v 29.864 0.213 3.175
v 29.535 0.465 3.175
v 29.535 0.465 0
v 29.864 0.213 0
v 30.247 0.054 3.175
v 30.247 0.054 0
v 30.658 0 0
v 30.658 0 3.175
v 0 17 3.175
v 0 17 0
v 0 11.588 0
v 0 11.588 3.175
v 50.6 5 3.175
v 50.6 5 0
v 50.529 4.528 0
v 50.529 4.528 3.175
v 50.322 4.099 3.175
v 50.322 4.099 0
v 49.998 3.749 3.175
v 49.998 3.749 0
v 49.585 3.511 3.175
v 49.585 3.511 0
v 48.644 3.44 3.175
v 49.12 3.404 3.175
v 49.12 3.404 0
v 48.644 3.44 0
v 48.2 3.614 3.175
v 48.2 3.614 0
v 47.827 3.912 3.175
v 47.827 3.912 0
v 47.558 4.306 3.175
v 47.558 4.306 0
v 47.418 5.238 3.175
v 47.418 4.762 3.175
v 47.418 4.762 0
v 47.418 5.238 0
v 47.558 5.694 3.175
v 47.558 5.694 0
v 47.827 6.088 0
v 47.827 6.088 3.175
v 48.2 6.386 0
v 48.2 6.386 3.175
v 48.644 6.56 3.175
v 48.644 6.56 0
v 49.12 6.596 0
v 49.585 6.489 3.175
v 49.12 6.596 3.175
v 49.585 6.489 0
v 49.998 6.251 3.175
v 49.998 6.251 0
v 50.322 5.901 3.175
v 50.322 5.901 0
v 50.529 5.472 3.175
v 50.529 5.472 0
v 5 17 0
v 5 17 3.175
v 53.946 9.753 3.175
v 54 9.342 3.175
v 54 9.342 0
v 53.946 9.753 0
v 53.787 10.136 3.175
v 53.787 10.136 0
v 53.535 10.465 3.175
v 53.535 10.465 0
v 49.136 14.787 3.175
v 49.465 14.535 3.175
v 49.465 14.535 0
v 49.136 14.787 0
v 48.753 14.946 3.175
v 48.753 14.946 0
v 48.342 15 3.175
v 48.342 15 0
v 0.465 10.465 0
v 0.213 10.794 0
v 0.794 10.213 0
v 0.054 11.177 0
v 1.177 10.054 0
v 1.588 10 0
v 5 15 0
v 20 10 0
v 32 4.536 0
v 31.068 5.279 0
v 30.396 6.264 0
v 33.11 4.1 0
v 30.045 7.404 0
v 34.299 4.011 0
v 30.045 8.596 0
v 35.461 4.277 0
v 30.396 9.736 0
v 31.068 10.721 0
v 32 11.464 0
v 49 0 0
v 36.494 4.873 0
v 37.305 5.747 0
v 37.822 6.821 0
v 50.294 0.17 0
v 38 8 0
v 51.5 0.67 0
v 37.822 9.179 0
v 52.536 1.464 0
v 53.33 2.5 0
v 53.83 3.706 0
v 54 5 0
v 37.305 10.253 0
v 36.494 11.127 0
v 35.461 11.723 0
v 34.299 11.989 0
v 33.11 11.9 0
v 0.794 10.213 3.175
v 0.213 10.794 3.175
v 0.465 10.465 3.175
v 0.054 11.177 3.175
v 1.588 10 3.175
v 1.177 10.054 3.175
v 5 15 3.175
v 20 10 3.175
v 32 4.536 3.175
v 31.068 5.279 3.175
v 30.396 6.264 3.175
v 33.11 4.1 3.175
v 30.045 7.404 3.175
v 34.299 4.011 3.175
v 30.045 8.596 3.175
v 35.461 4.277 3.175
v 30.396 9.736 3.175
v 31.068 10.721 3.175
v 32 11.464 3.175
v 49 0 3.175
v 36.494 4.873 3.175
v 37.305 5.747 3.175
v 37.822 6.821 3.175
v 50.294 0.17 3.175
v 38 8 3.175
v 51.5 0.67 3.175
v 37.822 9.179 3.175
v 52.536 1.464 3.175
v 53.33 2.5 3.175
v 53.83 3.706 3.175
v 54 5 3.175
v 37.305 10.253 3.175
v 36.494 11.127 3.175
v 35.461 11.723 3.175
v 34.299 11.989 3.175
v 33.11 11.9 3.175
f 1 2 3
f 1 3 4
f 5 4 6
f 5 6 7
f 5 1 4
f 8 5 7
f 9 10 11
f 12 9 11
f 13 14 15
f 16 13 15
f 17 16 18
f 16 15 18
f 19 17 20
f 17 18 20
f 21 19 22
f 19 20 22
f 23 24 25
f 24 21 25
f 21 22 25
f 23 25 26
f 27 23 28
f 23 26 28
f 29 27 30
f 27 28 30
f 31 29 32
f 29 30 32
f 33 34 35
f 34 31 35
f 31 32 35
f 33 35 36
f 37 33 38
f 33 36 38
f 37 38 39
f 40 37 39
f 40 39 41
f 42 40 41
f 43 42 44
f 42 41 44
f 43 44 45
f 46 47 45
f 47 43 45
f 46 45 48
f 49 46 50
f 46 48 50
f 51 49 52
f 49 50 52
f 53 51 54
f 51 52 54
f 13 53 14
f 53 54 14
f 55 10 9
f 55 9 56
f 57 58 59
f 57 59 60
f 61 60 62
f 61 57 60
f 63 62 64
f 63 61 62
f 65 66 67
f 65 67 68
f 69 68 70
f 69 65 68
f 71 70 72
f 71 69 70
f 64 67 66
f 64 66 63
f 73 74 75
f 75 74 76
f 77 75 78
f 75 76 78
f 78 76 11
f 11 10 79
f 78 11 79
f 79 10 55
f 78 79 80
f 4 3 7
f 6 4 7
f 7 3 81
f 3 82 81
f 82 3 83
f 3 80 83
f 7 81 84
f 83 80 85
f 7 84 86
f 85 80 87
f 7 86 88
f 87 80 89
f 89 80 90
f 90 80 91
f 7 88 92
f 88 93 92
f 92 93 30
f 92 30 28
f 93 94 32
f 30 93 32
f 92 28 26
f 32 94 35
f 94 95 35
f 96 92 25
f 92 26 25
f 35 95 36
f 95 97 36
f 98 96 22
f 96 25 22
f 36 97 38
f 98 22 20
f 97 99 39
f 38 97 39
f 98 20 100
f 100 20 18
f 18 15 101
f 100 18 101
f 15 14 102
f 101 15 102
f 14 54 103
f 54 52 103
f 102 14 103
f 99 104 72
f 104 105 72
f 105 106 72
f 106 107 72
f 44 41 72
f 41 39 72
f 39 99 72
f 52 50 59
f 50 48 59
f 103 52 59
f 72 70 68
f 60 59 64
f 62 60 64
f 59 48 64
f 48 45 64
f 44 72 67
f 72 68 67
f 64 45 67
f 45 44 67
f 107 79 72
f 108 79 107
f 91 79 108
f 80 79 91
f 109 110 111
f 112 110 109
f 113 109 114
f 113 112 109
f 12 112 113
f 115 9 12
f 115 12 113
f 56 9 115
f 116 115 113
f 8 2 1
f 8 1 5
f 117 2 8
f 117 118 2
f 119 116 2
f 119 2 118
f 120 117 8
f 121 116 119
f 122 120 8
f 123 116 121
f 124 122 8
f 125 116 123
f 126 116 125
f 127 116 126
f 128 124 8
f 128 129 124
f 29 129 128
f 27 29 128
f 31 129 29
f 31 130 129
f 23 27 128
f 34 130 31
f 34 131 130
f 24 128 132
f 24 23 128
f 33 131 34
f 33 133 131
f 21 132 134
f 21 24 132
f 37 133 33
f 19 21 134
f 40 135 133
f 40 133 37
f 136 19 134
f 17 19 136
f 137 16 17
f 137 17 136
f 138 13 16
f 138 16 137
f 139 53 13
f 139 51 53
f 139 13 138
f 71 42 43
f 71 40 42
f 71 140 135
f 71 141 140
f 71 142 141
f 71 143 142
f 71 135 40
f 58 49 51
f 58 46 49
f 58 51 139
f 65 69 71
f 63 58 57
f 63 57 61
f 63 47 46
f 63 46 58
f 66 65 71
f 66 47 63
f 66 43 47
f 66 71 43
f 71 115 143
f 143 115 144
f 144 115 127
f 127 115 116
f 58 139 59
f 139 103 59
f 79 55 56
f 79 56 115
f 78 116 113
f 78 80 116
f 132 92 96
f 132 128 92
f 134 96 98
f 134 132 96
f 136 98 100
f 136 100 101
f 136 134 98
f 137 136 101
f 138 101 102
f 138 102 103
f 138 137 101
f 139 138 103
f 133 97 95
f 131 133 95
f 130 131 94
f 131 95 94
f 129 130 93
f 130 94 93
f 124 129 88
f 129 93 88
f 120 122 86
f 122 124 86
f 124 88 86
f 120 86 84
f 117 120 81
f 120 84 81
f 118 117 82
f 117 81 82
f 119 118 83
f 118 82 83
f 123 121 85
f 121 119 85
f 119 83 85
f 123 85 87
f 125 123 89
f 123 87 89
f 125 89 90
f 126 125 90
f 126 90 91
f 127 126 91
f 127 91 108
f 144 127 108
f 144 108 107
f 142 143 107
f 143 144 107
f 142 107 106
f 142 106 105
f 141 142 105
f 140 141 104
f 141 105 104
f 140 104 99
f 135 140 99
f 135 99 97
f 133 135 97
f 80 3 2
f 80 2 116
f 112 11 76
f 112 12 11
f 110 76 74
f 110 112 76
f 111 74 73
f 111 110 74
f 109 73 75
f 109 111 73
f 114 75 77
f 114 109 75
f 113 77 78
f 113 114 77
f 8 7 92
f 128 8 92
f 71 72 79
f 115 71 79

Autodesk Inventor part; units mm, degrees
ref_plane "YZ Plane" through (0, 0, 0) normal (1, 0, 0) x (0, 1, 0)
ref_plane "XZ Plane" through (0, 0, 0) normal (0, 1, 0) x (-1, 0, 0)
ref_plane "XY Plane" through (0, 0, 0) normal (0, 0, 1) x (1, 0, 0)
sketch "Sketch1" plane through (0, 0, 0) normal (0, 0, 1) x (1, 0, 0)
  line L0 (30, 0) -> (54, 0)
  line L1 (54, 0) -> (54, 10)
  circle A0 centre (49, 5) radius 1.6
  circle A1 centre (34, 8) radius 4
  line L2 (49, 15) -> (54, 10)
  line L3 (30, 0) -> (20, 10)
  line L4 (0, 15) -> (0, 10)
  line L5 (0, 10) -> (0, 12.5)
  line L6 (20, 10) -> (0, 10)
  line L7 (0, 15) -> (0, 17)
  line L8 (0, 17) -> (5, 17)
  line L9 (5, 17) -> (5, 15)
  line L10 (30, 15) -> (0, 15)
  line L11 (49, 15) -> (30, 15)
  line L12 (30, 15) -> (30, 15)
  point P0 (0, 0)
  dimension "d0" = 3.2
  dimension "d1" = 8
  dimension "d3" = 15
  dimension "d4" = 5
  dimension "d5" = 5
  dimension "d10" = 8
  dimension "d13" = 10
  dimension "d29" = 5
  dimension "d30" = 2
  dimension "d33" = 15
  dimension "d34" = 45
  dimension "d37" = 20
  dimension "d38" = 5
  dimension "d42" = 10
  dimension "d44" = 34
  dimension "d45" = 19
  dimension "d46" = 0
extrude "Extrusion1" add sketch "Sketch1" along normal blind 3.175
fillet "Fillet1" radius 1.5875 4 edges at (54, 10, 1.5875) (0, 10, 1.5875) (30, 0, 1.5875) (49, 15, 1.5875)
fillet "Fillet1" radius 5 1 edges at (54, 0, 1.5875)
equation "\"d7\" = THICKA"
equation "\"THICKA\" = 3.175"
equation "\"THICKB\" = 6.731"
equation "\"THICKC\" = 12.7"
equation "\"BALLDIA\" = 12"
equation "\"MAGDIA\" = 9.5"
properties part number "Air2D_Hinge_Sideplate"
